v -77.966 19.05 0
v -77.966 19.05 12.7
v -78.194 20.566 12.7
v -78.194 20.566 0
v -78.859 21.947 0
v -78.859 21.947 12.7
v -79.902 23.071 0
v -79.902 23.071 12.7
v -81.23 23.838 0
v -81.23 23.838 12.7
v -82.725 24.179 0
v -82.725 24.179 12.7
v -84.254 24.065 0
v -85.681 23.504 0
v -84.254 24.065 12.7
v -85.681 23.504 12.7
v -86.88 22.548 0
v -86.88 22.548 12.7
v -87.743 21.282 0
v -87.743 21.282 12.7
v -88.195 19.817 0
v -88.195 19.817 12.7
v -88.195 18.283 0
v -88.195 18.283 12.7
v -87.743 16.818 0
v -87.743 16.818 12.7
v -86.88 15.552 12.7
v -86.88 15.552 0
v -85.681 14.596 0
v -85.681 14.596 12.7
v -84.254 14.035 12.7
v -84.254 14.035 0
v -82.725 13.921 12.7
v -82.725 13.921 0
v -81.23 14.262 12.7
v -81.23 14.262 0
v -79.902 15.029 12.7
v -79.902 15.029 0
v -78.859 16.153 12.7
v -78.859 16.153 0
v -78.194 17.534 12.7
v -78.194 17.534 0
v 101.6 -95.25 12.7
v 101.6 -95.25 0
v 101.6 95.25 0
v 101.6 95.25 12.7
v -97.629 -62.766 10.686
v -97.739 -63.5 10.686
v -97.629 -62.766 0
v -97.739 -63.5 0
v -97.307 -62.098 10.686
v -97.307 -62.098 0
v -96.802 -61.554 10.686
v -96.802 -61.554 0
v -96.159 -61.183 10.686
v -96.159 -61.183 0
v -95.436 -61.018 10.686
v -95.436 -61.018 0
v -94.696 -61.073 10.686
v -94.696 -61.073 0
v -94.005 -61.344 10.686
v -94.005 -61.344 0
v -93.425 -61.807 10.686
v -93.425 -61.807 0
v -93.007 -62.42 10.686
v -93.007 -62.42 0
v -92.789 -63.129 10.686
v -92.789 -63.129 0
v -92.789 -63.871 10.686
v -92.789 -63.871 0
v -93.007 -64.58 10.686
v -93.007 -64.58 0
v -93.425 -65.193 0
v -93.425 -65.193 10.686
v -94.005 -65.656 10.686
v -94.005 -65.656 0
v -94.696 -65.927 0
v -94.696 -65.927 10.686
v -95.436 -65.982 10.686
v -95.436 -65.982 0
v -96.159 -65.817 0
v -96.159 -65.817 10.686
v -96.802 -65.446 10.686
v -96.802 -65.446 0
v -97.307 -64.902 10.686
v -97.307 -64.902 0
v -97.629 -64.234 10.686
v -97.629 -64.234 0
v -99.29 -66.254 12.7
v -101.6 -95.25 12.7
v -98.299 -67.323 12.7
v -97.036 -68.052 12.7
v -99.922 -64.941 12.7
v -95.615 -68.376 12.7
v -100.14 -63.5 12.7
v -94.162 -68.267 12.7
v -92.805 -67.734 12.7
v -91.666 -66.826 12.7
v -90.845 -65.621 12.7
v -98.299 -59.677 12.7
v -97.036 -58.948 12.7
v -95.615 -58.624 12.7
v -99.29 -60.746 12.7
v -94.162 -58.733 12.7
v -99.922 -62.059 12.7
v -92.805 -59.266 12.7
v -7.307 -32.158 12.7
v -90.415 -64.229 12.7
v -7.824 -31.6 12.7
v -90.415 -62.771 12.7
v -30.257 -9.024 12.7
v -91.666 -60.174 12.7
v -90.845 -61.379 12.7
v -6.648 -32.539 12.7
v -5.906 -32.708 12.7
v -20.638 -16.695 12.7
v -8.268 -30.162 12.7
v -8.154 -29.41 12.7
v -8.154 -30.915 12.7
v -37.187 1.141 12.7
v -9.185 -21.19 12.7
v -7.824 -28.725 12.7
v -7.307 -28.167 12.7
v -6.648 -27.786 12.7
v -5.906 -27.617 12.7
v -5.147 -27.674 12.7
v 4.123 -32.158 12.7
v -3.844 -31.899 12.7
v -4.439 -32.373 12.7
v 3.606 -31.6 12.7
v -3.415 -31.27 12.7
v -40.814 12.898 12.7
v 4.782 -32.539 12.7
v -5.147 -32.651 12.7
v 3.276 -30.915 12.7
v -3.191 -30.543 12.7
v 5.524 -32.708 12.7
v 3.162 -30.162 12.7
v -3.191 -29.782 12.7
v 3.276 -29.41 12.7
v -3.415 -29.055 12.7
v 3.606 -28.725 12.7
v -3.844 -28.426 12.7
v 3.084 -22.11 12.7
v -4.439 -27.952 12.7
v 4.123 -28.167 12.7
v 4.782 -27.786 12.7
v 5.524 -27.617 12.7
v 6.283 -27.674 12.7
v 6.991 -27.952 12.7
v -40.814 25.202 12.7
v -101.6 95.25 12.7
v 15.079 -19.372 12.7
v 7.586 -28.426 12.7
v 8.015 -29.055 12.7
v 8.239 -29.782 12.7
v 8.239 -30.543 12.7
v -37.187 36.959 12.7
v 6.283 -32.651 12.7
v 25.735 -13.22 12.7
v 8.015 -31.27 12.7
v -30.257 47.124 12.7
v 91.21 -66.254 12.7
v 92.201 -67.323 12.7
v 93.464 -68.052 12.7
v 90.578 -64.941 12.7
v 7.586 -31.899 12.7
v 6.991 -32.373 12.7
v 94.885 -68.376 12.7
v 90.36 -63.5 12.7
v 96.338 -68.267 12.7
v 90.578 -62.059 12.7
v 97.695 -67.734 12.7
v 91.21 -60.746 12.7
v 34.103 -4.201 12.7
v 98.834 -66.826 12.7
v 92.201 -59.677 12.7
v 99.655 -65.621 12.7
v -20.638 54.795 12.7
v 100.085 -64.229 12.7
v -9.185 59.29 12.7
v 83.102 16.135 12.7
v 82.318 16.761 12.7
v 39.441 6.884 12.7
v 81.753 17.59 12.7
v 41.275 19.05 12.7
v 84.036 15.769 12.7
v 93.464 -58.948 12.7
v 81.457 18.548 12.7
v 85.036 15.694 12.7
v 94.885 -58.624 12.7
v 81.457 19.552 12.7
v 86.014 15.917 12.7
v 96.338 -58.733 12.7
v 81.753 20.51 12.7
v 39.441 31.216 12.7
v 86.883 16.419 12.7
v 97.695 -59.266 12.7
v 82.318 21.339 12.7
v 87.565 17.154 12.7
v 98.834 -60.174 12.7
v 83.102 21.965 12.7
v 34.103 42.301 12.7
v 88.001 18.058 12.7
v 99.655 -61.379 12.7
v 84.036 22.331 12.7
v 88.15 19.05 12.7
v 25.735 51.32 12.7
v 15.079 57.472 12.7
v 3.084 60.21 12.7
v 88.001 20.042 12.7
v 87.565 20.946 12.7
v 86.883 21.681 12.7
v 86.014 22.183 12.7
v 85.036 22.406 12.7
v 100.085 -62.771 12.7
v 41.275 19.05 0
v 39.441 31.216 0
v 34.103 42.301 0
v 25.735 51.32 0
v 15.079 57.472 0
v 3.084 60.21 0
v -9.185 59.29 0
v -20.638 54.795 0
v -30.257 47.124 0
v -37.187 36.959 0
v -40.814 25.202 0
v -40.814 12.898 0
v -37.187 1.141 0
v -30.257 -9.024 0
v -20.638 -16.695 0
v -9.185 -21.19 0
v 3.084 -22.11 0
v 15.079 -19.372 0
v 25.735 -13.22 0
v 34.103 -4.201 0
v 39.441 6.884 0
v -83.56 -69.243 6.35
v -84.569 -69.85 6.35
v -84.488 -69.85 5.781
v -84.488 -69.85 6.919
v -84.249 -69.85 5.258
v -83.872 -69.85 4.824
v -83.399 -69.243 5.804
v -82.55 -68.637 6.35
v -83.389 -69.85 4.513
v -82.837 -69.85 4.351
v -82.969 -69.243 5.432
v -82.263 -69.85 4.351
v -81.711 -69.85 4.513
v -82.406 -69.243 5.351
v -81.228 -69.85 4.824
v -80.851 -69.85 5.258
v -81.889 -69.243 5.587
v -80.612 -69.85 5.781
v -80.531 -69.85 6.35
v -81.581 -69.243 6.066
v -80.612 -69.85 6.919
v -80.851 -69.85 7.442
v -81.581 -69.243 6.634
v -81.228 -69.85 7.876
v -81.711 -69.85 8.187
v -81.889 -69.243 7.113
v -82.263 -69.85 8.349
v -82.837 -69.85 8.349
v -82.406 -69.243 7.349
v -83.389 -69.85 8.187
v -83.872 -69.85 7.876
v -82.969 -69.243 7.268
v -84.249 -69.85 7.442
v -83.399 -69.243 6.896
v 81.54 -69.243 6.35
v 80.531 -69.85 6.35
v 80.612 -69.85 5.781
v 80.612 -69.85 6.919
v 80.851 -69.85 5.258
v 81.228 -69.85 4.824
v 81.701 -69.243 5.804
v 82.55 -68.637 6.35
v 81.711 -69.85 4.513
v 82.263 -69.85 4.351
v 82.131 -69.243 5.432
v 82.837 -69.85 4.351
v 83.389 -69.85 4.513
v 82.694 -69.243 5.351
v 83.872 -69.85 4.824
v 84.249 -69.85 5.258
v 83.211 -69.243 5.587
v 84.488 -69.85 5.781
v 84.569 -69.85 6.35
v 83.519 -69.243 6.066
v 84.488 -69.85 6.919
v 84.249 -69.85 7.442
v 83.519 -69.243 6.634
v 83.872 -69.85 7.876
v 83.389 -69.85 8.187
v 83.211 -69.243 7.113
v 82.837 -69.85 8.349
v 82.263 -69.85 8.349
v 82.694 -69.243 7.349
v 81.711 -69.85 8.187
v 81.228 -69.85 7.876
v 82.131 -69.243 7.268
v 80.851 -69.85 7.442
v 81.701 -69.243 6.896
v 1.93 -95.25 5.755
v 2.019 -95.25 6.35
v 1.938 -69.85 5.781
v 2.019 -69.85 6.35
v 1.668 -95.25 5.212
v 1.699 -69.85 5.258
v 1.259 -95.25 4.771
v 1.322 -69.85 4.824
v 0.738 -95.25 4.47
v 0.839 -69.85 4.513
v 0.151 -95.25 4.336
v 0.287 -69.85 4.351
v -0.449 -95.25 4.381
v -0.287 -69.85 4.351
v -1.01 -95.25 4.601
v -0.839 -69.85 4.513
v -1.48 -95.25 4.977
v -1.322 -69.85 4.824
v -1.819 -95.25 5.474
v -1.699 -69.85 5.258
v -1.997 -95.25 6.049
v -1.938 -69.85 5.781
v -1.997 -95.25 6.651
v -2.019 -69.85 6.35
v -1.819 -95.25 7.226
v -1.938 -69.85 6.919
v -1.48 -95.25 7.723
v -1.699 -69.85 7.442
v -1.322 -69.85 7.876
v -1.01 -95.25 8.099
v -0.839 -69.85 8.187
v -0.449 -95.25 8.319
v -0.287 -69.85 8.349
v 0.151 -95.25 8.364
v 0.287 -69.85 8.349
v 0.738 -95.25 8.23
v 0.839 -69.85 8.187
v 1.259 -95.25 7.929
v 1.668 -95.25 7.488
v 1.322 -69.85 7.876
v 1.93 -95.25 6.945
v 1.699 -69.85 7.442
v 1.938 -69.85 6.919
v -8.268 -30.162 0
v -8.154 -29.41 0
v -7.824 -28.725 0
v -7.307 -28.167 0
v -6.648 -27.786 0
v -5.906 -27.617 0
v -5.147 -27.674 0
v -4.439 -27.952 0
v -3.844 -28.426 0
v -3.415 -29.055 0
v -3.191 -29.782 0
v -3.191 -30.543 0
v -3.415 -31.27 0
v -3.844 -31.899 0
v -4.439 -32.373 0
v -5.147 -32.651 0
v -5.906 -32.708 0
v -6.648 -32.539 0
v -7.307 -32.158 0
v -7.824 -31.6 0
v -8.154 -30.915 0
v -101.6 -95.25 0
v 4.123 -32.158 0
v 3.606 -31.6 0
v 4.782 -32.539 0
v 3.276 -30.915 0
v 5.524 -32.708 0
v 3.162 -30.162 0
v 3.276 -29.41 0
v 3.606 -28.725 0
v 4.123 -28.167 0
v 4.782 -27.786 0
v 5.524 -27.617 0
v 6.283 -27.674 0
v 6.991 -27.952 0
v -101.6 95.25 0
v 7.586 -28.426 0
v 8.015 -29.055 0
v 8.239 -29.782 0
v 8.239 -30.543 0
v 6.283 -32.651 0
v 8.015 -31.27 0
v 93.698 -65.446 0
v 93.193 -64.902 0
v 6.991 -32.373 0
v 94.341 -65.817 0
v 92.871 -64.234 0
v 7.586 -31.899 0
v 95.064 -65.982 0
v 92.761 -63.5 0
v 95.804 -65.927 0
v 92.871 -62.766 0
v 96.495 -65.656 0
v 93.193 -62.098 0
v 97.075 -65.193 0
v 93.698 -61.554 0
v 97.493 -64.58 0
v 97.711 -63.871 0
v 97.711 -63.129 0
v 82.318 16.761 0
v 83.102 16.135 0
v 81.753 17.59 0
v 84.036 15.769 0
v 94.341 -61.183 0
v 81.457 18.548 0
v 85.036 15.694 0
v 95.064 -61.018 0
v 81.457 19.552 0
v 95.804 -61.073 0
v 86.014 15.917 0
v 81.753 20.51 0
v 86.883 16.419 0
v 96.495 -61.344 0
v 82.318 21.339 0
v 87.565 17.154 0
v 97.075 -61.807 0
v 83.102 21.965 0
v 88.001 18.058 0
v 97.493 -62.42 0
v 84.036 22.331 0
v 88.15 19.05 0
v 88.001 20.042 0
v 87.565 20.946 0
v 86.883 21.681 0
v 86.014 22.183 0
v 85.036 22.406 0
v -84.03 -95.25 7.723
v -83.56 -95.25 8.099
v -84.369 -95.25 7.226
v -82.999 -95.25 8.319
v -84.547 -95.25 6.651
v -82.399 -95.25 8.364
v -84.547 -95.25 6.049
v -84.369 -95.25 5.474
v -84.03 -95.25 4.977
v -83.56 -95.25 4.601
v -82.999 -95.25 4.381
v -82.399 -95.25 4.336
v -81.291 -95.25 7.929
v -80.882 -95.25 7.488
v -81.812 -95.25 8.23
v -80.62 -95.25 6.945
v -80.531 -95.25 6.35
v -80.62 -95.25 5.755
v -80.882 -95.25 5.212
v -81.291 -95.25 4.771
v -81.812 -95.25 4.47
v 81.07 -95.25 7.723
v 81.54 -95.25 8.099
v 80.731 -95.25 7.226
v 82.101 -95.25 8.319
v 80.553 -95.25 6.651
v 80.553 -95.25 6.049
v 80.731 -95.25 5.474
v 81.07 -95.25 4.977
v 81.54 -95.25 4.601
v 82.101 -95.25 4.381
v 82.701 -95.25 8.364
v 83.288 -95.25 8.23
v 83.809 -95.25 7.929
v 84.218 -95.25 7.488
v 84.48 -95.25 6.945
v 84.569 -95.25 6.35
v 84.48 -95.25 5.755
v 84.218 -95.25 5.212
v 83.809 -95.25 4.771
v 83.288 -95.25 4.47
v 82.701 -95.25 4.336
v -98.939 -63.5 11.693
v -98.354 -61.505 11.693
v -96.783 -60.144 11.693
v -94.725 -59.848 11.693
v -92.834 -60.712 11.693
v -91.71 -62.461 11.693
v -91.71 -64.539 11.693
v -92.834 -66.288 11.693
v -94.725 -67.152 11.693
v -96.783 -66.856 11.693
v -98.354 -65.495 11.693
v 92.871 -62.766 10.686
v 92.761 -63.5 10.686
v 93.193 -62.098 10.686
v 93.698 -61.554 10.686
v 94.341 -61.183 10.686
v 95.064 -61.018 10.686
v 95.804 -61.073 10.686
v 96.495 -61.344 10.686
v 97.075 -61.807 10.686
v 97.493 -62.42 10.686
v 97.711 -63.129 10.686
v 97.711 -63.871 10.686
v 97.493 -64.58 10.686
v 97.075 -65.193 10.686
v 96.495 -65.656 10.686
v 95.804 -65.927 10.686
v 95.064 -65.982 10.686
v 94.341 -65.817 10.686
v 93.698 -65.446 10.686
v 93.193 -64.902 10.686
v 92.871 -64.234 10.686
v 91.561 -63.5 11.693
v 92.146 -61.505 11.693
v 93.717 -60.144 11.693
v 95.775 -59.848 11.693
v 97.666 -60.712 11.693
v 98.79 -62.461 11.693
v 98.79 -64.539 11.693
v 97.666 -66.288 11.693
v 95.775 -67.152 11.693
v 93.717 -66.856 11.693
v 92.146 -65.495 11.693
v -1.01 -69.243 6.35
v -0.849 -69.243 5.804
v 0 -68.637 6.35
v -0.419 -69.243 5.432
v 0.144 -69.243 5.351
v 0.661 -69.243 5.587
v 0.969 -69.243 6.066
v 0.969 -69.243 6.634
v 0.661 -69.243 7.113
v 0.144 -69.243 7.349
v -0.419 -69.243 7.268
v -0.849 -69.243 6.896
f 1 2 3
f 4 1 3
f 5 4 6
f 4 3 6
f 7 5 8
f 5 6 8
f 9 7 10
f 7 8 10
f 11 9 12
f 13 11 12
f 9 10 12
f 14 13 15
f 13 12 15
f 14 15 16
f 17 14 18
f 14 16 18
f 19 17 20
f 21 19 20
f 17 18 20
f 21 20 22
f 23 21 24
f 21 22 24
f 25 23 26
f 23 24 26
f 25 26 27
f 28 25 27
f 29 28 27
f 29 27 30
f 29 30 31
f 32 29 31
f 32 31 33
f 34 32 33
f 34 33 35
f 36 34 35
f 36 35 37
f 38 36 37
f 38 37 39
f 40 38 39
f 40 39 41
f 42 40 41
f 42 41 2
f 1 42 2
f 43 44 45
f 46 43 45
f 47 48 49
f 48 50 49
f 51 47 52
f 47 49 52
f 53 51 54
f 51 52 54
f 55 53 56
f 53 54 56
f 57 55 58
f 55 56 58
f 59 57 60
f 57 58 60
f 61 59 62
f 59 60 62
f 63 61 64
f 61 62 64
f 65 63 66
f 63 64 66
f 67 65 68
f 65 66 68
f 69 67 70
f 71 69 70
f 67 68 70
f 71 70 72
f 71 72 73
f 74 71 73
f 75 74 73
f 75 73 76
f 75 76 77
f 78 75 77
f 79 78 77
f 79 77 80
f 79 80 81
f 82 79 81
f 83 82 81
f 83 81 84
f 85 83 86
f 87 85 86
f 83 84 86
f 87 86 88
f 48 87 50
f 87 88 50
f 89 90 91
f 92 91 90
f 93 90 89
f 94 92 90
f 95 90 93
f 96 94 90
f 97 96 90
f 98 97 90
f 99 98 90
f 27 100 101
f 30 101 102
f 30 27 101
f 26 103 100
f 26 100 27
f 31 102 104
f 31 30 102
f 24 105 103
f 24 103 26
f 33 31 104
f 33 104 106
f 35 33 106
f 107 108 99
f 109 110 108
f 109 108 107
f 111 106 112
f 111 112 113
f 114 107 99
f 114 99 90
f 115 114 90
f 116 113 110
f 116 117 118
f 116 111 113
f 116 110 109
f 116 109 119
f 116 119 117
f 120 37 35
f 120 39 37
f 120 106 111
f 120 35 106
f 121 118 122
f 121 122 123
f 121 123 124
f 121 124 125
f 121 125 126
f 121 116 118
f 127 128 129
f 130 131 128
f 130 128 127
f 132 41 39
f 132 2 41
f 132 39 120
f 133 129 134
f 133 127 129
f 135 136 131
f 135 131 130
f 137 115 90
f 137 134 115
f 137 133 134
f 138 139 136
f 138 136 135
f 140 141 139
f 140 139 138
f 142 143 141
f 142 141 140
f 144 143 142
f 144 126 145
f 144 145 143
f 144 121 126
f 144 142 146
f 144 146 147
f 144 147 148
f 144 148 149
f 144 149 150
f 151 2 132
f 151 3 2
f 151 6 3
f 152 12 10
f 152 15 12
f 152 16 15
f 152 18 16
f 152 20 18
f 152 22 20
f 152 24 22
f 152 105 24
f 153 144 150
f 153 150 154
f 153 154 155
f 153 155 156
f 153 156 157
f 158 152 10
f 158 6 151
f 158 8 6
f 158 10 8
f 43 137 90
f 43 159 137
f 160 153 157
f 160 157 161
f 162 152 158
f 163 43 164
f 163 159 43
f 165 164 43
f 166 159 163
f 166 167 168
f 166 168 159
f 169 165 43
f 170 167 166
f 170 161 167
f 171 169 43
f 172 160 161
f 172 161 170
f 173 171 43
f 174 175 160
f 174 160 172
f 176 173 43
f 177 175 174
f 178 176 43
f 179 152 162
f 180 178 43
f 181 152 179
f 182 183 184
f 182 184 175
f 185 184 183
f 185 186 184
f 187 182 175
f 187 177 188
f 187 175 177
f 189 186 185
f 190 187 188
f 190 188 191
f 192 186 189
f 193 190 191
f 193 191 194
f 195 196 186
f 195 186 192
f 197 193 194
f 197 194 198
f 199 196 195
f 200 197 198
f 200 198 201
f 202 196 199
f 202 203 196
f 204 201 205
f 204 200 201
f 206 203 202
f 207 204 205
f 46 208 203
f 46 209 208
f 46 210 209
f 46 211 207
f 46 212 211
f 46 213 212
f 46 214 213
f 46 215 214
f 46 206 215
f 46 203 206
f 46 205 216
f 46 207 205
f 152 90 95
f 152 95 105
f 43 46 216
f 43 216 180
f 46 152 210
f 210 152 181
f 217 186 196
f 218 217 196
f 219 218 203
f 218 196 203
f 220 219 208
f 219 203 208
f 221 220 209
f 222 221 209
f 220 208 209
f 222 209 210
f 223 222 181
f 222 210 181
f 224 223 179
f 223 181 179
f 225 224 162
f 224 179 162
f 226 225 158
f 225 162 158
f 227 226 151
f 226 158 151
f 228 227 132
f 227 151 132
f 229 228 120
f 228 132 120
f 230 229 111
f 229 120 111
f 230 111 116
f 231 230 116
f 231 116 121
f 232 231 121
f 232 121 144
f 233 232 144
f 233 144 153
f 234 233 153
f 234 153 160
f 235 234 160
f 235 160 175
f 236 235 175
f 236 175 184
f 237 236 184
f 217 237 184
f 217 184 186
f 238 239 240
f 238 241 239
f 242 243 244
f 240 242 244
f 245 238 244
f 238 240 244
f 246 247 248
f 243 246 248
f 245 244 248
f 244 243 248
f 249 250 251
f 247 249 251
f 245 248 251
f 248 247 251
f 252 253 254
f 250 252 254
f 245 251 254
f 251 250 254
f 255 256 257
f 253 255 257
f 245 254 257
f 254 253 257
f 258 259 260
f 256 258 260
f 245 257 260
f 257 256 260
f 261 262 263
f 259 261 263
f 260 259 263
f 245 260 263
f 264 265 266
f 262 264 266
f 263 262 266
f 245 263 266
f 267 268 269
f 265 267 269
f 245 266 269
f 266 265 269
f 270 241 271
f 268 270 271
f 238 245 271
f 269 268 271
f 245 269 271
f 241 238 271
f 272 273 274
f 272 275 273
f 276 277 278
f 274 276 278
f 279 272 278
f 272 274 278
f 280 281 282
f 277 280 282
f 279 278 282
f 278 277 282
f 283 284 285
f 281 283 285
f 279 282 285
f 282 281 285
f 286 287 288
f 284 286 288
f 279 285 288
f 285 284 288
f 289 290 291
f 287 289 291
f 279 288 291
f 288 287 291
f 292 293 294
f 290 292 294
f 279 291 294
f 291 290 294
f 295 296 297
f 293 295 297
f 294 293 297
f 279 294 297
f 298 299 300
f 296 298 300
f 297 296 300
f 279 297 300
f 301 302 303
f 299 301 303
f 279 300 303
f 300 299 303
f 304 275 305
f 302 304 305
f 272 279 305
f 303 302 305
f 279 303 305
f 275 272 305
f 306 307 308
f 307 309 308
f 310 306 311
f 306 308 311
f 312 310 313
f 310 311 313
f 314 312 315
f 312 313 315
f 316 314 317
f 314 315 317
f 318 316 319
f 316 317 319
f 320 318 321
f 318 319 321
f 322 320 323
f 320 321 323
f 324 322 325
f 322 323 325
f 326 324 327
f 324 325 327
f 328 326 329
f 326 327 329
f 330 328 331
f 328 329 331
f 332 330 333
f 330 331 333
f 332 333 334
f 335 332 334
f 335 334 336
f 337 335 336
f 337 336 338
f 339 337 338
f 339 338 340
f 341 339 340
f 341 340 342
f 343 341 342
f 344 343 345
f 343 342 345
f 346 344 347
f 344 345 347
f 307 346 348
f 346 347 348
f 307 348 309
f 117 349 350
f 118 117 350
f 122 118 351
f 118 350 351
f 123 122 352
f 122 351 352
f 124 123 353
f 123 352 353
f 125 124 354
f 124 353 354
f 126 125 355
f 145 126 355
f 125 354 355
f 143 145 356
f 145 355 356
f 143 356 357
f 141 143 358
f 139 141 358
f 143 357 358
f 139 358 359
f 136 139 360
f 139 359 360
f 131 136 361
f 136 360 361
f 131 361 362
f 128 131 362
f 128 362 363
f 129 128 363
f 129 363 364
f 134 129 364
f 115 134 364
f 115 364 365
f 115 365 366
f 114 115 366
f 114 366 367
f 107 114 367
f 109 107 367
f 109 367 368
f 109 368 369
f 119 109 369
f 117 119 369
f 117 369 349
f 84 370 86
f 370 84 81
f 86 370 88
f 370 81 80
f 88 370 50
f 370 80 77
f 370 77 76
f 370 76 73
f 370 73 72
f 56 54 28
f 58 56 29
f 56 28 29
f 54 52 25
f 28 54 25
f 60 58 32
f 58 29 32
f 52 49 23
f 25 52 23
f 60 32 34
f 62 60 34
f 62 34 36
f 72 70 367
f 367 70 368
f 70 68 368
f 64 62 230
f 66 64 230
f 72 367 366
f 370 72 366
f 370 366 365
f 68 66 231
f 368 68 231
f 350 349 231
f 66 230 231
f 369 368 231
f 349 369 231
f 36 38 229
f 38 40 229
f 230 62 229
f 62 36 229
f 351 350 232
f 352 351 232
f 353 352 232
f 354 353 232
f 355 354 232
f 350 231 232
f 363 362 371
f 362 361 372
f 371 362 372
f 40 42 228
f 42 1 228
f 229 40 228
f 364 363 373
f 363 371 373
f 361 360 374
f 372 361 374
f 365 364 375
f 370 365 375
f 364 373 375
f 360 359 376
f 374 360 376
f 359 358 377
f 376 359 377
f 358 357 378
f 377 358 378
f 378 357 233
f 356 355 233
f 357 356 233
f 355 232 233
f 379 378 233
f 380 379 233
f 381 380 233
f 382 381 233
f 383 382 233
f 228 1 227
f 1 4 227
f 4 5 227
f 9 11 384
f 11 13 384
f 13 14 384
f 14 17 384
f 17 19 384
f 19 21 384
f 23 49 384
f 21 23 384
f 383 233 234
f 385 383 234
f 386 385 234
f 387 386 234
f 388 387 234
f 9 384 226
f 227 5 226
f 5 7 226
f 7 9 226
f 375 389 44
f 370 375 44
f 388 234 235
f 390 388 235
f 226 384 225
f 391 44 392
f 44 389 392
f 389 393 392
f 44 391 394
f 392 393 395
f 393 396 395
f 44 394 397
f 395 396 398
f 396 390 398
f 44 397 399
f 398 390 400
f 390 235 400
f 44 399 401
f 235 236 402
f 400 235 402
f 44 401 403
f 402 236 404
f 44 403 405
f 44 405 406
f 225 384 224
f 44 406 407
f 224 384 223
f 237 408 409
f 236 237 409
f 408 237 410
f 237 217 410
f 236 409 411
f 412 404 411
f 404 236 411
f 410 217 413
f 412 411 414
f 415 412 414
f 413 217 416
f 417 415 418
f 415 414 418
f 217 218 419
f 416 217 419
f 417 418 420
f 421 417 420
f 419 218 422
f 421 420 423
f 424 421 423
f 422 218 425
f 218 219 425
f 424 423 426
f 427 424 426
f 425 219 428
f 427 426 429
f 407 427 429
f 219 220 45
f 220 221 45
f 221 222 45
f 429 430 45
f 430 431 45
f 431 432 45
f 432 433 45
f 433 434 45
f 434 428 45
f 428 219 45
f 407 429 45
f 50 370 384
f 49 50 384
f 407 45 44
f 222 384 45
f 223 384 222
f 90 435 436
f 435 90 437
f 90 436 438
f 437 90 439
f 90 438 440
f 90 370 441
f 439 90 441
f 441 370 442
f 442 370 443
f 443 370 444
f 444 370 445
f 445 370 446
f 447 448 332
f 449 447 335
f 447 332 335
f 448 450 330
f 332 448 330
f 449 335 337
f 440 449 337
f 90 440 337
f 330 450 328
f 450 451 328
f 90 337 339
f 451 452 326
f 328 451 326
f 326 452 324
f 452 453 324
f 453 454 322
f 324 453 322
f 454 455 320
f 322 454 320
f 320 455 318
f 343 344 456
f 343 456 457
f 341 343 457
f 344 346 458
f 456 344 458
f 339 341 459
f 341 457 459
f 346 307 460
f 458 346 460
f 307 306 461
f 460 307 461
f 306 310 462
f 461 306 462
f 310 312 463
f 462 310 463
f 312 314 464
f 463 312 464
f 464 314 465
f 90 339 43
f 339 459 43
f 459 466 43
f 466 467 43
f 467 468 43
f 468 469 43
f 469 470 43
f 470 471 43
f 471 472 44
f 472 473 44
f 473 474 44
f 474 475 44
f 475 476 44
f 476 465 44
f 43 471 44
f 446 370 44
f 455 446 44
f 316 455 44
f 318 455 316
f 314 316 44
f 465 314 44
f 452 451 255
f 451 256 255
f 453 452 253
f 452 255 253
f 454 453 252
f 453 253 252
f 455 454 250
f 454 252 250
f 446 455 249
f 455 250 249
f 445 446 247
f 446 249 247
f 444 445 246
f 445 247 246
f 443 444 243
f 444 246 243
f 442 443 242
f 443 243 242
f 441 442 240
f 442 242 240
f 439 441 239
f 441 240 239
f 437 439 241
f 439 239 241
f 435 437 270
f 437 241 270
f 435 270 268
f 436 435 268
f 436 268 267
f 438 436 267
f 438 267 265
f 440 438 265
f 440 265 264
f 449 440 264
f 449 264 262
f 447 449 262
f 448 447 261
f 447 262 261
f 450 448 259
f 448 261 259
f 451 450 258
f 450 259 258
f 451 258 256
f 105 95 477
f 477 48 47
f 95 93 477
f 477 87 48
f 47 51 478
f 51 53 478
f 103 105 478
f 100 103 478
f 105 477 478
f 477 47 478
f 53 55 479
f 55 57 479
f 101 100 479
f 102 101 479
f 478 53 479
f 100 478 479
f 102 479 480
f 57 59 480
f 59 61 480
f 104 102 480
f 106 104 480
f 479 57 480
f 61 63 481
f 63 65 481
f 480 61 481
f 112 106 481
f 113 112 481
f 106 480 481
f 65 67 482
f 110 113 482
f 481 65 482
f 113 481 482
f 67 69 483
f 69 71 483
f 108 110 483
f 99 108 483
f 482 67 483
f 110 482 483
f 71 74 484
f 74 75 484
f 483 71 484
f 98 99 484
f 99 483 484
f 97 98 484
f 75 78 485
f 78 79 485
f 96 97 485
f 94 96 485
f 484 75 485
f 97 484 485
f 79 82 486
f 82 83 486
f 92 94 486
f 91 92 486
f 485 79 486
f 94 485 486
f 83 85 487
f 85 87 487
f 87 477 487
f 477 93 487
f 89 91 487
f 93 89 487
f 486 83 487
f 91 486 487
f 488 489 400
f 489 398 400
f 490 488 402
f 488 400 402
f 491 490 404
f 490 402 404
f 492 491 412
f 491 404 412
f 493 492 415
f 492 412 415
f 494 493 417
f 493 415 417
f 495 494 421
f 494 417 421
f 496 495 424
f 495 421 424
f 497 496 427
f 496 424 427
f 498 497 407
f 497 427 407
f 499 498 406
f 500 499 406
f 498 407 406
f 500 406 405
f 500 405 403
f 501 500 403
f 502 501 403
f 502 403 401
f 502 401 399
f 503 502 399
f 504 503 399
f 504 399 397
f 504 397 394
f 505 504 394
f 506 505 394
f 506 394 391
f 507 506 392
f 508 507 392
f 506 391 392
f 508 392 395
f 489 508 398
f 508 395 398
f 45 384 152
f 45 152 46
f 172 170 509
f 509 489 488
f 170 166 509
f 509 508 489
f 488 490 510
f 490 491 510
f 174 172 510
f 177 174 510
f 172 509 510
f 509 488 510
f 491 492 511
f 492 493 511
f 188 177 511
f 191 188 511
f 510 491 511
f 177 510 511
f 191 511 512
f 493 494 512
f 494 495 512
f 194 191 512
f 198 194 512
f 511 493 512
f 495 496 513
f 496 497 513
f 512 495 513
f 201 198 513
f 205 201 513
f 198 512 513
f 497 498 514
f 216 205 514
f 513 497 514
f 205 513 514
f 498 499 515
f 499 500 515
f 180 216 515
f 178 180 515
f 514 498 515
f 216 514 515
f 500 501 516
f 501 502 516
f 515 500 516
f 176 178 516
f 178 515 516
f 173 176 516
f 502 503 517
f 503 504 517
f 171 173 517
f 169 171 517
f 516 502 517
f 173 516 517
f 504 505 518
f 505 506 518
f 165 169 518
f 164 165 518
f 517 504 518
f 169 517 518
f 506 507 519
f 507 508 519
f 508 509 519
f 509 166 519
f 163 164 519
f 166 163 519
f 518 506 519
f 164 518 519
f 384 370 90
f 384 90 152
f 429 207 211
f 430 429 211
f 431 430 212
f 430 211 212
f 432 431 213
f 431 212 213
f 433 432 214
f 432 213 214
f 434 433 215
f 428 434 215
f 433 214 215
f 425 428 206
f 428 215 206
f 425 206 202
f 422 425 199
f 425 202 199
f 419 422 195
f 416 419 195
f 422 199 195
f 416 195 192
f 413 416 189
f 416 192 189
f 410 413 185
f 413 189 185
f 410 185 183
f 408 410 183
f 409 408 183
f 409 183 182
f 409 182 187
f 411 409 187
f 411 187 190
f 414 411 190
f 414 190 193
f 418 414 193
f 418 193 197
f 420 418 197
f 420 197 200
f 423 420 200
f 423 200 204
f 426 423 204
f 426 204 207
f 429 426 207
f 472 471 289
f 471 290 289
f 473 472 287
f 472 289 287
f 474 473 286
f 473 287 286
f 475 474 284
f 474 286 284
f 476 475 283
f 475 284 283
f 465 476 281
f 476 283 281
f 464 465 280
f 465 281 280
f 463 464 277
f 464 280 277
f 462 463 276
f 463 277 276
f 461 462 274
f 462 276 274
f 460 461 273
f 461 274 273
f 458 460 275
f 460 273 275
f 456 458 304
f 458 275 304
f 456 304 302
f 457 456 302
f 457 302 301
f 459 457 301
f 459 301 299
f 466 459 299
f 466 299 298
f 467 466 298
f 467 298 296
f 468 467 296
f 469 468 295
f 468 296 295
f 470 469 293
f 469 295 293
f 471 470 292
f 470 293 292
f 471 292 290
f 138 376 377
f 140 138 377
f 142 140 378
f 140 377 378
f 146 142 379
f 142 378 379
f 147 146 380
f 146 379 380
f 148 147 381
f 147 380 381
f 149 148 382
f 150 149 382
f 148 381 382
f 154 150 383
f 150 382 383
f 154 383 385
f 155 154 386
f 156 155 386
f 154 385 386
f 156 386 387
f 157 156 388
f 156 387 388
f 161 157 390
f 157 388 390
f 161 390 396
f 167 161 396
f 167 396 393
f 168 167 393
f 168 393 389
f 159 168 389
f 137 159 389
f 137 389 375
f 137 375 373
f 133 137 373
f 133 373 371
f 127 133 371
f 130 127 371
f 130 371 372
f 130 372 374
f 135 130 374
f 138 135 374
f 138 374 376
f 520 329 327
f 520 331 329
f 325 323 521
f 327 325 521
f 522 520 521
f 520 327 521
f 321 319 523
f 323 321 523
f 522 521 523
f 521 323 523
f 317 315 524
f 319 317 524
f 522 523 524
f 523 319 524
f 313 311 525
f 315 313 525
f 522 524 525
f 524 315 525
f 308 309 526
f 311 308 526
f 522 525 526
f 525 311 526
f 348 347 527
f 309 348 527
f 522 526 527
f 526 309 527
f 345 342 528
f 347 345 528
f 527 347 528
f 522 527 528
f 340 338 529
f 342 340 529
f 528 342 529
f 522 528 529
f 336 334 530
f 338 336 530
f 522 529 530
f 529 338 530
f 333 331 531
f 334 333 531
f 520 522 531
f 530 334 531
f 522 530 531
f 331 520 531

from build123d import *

# Parameters (mm, degrees)
SKETCH1_W                                          = 203.2
SKETCH1_H                                          = 190.5
BOSS_EXTRUDE1_DEPTH                                = 12.7
SKETCH2_R                                          = 41.275
SKETCH2_R_2                                        = 5.1435
SKETCH2_R_3                                        = 3.3655
CUT_EXTRUDE1_DEPTH                                 = 140.844243714
F_10_32_TAPPED_HOLE1_D                             = 4.0386
F_10_32_TAPPED_HOLE1_DEPTH                         = 25.4
F_10_32_TAPPED_HOLE1_TIP                           = 1.213317848
CSK_FOR_10_FLAT_HEAD_MACHINE_SCREW_100_D           = 4.9784
CSK_FOR_10_FLAT_HEAD_MACHINE_SCREW_100_CSINK_D     = 9.779
CSK_FOR_10_FLAT_HEAD_MACHINE_SCREW_100_CSINK_ANGLE = 100
F_7_0_201_DIAMETER_HOLE1_D                         = 5.1054


with BuildPart() as part:
    # Sketch1 → Boss-Extrude1 (new body)
    with BuildSketch(Plane.XY):
        Rectangle(SKETCH1_W, SKETCH1_H)
    extrude(amount=BOSS_EXTRUDE1_DEPTH)

    # Sketch2 → Cut-Extrude1 (cut, through all)
    with BuildSketch(Plane.XY.offset(12.7)):
        with Locations((0, 19.05)):
            Circle(SKETCH2_R)
        with Locations((-83.109250243, 19.05)):
            Circle(SKETCH2_R_2)
        with Locations((84.784749757, 19.05)):
            Circle(SKETCH2_R_3)
    extrude(amount=-CUT_EXTRUDE1_DEPTH, mode=Mode.SUBTRACT)

    # #10-32 Tapped Hole1
    with Locations(Plane(origin=(0, -95.25, 0), x_dir=(-1, 0, 0), z_dir=(0, -1, 0))):
        with Locations((82.55, -6.35), (0, -6.35), (-82.55, -6.35)):
            Hole(F_10_32_TAPPED_HOLE1_D / 2, depth=F_10_32_TAPPED_HOLE1_DEPTH)
            with Locations((0, 0, -(F_10_32_TAPPED_HOLE1_DEPTH + F_10_32_TAPPED_HOLE1_TIP / 2))):  # 118° drill point
                Cone(0, F_10_32_TAPPED_HOLE1_D / 2, F_10_32_TAPPED_HOLE1_TIP, mode=Mode.SUBTRACT)

    # CSK for #10 Flat Head Machine Screw (100)1 (through all)
    with Locations(Plane.XY.offset(12.7)):
        with Locations((-95.25, -63.5), (95.25, -63.5)):
            CounterSinkHole(CSK_FOR_10_FLAT_HEAD_MACHINE_SCREW_100_D / 2, CSK_FOR_10_FLAT_HEAD_MACHINE_SCREW_100_CSINK_D / 2, counter_sink_angle=CSK_FOR_10_FLAT_HEAD_MACHINE_SCREW_100_CSINK_ANGLE)

    # #7 (0.201) Diameter Hole1 (through all)
    with Locations(Plane.XY.offset(12.7)):
        with Locations((-5.715, -30.1625), (5.715, -30.1625)):
            Hole(F_7_0_201_DIAMETER_HOLE1_D / 2)


solid = part.part
